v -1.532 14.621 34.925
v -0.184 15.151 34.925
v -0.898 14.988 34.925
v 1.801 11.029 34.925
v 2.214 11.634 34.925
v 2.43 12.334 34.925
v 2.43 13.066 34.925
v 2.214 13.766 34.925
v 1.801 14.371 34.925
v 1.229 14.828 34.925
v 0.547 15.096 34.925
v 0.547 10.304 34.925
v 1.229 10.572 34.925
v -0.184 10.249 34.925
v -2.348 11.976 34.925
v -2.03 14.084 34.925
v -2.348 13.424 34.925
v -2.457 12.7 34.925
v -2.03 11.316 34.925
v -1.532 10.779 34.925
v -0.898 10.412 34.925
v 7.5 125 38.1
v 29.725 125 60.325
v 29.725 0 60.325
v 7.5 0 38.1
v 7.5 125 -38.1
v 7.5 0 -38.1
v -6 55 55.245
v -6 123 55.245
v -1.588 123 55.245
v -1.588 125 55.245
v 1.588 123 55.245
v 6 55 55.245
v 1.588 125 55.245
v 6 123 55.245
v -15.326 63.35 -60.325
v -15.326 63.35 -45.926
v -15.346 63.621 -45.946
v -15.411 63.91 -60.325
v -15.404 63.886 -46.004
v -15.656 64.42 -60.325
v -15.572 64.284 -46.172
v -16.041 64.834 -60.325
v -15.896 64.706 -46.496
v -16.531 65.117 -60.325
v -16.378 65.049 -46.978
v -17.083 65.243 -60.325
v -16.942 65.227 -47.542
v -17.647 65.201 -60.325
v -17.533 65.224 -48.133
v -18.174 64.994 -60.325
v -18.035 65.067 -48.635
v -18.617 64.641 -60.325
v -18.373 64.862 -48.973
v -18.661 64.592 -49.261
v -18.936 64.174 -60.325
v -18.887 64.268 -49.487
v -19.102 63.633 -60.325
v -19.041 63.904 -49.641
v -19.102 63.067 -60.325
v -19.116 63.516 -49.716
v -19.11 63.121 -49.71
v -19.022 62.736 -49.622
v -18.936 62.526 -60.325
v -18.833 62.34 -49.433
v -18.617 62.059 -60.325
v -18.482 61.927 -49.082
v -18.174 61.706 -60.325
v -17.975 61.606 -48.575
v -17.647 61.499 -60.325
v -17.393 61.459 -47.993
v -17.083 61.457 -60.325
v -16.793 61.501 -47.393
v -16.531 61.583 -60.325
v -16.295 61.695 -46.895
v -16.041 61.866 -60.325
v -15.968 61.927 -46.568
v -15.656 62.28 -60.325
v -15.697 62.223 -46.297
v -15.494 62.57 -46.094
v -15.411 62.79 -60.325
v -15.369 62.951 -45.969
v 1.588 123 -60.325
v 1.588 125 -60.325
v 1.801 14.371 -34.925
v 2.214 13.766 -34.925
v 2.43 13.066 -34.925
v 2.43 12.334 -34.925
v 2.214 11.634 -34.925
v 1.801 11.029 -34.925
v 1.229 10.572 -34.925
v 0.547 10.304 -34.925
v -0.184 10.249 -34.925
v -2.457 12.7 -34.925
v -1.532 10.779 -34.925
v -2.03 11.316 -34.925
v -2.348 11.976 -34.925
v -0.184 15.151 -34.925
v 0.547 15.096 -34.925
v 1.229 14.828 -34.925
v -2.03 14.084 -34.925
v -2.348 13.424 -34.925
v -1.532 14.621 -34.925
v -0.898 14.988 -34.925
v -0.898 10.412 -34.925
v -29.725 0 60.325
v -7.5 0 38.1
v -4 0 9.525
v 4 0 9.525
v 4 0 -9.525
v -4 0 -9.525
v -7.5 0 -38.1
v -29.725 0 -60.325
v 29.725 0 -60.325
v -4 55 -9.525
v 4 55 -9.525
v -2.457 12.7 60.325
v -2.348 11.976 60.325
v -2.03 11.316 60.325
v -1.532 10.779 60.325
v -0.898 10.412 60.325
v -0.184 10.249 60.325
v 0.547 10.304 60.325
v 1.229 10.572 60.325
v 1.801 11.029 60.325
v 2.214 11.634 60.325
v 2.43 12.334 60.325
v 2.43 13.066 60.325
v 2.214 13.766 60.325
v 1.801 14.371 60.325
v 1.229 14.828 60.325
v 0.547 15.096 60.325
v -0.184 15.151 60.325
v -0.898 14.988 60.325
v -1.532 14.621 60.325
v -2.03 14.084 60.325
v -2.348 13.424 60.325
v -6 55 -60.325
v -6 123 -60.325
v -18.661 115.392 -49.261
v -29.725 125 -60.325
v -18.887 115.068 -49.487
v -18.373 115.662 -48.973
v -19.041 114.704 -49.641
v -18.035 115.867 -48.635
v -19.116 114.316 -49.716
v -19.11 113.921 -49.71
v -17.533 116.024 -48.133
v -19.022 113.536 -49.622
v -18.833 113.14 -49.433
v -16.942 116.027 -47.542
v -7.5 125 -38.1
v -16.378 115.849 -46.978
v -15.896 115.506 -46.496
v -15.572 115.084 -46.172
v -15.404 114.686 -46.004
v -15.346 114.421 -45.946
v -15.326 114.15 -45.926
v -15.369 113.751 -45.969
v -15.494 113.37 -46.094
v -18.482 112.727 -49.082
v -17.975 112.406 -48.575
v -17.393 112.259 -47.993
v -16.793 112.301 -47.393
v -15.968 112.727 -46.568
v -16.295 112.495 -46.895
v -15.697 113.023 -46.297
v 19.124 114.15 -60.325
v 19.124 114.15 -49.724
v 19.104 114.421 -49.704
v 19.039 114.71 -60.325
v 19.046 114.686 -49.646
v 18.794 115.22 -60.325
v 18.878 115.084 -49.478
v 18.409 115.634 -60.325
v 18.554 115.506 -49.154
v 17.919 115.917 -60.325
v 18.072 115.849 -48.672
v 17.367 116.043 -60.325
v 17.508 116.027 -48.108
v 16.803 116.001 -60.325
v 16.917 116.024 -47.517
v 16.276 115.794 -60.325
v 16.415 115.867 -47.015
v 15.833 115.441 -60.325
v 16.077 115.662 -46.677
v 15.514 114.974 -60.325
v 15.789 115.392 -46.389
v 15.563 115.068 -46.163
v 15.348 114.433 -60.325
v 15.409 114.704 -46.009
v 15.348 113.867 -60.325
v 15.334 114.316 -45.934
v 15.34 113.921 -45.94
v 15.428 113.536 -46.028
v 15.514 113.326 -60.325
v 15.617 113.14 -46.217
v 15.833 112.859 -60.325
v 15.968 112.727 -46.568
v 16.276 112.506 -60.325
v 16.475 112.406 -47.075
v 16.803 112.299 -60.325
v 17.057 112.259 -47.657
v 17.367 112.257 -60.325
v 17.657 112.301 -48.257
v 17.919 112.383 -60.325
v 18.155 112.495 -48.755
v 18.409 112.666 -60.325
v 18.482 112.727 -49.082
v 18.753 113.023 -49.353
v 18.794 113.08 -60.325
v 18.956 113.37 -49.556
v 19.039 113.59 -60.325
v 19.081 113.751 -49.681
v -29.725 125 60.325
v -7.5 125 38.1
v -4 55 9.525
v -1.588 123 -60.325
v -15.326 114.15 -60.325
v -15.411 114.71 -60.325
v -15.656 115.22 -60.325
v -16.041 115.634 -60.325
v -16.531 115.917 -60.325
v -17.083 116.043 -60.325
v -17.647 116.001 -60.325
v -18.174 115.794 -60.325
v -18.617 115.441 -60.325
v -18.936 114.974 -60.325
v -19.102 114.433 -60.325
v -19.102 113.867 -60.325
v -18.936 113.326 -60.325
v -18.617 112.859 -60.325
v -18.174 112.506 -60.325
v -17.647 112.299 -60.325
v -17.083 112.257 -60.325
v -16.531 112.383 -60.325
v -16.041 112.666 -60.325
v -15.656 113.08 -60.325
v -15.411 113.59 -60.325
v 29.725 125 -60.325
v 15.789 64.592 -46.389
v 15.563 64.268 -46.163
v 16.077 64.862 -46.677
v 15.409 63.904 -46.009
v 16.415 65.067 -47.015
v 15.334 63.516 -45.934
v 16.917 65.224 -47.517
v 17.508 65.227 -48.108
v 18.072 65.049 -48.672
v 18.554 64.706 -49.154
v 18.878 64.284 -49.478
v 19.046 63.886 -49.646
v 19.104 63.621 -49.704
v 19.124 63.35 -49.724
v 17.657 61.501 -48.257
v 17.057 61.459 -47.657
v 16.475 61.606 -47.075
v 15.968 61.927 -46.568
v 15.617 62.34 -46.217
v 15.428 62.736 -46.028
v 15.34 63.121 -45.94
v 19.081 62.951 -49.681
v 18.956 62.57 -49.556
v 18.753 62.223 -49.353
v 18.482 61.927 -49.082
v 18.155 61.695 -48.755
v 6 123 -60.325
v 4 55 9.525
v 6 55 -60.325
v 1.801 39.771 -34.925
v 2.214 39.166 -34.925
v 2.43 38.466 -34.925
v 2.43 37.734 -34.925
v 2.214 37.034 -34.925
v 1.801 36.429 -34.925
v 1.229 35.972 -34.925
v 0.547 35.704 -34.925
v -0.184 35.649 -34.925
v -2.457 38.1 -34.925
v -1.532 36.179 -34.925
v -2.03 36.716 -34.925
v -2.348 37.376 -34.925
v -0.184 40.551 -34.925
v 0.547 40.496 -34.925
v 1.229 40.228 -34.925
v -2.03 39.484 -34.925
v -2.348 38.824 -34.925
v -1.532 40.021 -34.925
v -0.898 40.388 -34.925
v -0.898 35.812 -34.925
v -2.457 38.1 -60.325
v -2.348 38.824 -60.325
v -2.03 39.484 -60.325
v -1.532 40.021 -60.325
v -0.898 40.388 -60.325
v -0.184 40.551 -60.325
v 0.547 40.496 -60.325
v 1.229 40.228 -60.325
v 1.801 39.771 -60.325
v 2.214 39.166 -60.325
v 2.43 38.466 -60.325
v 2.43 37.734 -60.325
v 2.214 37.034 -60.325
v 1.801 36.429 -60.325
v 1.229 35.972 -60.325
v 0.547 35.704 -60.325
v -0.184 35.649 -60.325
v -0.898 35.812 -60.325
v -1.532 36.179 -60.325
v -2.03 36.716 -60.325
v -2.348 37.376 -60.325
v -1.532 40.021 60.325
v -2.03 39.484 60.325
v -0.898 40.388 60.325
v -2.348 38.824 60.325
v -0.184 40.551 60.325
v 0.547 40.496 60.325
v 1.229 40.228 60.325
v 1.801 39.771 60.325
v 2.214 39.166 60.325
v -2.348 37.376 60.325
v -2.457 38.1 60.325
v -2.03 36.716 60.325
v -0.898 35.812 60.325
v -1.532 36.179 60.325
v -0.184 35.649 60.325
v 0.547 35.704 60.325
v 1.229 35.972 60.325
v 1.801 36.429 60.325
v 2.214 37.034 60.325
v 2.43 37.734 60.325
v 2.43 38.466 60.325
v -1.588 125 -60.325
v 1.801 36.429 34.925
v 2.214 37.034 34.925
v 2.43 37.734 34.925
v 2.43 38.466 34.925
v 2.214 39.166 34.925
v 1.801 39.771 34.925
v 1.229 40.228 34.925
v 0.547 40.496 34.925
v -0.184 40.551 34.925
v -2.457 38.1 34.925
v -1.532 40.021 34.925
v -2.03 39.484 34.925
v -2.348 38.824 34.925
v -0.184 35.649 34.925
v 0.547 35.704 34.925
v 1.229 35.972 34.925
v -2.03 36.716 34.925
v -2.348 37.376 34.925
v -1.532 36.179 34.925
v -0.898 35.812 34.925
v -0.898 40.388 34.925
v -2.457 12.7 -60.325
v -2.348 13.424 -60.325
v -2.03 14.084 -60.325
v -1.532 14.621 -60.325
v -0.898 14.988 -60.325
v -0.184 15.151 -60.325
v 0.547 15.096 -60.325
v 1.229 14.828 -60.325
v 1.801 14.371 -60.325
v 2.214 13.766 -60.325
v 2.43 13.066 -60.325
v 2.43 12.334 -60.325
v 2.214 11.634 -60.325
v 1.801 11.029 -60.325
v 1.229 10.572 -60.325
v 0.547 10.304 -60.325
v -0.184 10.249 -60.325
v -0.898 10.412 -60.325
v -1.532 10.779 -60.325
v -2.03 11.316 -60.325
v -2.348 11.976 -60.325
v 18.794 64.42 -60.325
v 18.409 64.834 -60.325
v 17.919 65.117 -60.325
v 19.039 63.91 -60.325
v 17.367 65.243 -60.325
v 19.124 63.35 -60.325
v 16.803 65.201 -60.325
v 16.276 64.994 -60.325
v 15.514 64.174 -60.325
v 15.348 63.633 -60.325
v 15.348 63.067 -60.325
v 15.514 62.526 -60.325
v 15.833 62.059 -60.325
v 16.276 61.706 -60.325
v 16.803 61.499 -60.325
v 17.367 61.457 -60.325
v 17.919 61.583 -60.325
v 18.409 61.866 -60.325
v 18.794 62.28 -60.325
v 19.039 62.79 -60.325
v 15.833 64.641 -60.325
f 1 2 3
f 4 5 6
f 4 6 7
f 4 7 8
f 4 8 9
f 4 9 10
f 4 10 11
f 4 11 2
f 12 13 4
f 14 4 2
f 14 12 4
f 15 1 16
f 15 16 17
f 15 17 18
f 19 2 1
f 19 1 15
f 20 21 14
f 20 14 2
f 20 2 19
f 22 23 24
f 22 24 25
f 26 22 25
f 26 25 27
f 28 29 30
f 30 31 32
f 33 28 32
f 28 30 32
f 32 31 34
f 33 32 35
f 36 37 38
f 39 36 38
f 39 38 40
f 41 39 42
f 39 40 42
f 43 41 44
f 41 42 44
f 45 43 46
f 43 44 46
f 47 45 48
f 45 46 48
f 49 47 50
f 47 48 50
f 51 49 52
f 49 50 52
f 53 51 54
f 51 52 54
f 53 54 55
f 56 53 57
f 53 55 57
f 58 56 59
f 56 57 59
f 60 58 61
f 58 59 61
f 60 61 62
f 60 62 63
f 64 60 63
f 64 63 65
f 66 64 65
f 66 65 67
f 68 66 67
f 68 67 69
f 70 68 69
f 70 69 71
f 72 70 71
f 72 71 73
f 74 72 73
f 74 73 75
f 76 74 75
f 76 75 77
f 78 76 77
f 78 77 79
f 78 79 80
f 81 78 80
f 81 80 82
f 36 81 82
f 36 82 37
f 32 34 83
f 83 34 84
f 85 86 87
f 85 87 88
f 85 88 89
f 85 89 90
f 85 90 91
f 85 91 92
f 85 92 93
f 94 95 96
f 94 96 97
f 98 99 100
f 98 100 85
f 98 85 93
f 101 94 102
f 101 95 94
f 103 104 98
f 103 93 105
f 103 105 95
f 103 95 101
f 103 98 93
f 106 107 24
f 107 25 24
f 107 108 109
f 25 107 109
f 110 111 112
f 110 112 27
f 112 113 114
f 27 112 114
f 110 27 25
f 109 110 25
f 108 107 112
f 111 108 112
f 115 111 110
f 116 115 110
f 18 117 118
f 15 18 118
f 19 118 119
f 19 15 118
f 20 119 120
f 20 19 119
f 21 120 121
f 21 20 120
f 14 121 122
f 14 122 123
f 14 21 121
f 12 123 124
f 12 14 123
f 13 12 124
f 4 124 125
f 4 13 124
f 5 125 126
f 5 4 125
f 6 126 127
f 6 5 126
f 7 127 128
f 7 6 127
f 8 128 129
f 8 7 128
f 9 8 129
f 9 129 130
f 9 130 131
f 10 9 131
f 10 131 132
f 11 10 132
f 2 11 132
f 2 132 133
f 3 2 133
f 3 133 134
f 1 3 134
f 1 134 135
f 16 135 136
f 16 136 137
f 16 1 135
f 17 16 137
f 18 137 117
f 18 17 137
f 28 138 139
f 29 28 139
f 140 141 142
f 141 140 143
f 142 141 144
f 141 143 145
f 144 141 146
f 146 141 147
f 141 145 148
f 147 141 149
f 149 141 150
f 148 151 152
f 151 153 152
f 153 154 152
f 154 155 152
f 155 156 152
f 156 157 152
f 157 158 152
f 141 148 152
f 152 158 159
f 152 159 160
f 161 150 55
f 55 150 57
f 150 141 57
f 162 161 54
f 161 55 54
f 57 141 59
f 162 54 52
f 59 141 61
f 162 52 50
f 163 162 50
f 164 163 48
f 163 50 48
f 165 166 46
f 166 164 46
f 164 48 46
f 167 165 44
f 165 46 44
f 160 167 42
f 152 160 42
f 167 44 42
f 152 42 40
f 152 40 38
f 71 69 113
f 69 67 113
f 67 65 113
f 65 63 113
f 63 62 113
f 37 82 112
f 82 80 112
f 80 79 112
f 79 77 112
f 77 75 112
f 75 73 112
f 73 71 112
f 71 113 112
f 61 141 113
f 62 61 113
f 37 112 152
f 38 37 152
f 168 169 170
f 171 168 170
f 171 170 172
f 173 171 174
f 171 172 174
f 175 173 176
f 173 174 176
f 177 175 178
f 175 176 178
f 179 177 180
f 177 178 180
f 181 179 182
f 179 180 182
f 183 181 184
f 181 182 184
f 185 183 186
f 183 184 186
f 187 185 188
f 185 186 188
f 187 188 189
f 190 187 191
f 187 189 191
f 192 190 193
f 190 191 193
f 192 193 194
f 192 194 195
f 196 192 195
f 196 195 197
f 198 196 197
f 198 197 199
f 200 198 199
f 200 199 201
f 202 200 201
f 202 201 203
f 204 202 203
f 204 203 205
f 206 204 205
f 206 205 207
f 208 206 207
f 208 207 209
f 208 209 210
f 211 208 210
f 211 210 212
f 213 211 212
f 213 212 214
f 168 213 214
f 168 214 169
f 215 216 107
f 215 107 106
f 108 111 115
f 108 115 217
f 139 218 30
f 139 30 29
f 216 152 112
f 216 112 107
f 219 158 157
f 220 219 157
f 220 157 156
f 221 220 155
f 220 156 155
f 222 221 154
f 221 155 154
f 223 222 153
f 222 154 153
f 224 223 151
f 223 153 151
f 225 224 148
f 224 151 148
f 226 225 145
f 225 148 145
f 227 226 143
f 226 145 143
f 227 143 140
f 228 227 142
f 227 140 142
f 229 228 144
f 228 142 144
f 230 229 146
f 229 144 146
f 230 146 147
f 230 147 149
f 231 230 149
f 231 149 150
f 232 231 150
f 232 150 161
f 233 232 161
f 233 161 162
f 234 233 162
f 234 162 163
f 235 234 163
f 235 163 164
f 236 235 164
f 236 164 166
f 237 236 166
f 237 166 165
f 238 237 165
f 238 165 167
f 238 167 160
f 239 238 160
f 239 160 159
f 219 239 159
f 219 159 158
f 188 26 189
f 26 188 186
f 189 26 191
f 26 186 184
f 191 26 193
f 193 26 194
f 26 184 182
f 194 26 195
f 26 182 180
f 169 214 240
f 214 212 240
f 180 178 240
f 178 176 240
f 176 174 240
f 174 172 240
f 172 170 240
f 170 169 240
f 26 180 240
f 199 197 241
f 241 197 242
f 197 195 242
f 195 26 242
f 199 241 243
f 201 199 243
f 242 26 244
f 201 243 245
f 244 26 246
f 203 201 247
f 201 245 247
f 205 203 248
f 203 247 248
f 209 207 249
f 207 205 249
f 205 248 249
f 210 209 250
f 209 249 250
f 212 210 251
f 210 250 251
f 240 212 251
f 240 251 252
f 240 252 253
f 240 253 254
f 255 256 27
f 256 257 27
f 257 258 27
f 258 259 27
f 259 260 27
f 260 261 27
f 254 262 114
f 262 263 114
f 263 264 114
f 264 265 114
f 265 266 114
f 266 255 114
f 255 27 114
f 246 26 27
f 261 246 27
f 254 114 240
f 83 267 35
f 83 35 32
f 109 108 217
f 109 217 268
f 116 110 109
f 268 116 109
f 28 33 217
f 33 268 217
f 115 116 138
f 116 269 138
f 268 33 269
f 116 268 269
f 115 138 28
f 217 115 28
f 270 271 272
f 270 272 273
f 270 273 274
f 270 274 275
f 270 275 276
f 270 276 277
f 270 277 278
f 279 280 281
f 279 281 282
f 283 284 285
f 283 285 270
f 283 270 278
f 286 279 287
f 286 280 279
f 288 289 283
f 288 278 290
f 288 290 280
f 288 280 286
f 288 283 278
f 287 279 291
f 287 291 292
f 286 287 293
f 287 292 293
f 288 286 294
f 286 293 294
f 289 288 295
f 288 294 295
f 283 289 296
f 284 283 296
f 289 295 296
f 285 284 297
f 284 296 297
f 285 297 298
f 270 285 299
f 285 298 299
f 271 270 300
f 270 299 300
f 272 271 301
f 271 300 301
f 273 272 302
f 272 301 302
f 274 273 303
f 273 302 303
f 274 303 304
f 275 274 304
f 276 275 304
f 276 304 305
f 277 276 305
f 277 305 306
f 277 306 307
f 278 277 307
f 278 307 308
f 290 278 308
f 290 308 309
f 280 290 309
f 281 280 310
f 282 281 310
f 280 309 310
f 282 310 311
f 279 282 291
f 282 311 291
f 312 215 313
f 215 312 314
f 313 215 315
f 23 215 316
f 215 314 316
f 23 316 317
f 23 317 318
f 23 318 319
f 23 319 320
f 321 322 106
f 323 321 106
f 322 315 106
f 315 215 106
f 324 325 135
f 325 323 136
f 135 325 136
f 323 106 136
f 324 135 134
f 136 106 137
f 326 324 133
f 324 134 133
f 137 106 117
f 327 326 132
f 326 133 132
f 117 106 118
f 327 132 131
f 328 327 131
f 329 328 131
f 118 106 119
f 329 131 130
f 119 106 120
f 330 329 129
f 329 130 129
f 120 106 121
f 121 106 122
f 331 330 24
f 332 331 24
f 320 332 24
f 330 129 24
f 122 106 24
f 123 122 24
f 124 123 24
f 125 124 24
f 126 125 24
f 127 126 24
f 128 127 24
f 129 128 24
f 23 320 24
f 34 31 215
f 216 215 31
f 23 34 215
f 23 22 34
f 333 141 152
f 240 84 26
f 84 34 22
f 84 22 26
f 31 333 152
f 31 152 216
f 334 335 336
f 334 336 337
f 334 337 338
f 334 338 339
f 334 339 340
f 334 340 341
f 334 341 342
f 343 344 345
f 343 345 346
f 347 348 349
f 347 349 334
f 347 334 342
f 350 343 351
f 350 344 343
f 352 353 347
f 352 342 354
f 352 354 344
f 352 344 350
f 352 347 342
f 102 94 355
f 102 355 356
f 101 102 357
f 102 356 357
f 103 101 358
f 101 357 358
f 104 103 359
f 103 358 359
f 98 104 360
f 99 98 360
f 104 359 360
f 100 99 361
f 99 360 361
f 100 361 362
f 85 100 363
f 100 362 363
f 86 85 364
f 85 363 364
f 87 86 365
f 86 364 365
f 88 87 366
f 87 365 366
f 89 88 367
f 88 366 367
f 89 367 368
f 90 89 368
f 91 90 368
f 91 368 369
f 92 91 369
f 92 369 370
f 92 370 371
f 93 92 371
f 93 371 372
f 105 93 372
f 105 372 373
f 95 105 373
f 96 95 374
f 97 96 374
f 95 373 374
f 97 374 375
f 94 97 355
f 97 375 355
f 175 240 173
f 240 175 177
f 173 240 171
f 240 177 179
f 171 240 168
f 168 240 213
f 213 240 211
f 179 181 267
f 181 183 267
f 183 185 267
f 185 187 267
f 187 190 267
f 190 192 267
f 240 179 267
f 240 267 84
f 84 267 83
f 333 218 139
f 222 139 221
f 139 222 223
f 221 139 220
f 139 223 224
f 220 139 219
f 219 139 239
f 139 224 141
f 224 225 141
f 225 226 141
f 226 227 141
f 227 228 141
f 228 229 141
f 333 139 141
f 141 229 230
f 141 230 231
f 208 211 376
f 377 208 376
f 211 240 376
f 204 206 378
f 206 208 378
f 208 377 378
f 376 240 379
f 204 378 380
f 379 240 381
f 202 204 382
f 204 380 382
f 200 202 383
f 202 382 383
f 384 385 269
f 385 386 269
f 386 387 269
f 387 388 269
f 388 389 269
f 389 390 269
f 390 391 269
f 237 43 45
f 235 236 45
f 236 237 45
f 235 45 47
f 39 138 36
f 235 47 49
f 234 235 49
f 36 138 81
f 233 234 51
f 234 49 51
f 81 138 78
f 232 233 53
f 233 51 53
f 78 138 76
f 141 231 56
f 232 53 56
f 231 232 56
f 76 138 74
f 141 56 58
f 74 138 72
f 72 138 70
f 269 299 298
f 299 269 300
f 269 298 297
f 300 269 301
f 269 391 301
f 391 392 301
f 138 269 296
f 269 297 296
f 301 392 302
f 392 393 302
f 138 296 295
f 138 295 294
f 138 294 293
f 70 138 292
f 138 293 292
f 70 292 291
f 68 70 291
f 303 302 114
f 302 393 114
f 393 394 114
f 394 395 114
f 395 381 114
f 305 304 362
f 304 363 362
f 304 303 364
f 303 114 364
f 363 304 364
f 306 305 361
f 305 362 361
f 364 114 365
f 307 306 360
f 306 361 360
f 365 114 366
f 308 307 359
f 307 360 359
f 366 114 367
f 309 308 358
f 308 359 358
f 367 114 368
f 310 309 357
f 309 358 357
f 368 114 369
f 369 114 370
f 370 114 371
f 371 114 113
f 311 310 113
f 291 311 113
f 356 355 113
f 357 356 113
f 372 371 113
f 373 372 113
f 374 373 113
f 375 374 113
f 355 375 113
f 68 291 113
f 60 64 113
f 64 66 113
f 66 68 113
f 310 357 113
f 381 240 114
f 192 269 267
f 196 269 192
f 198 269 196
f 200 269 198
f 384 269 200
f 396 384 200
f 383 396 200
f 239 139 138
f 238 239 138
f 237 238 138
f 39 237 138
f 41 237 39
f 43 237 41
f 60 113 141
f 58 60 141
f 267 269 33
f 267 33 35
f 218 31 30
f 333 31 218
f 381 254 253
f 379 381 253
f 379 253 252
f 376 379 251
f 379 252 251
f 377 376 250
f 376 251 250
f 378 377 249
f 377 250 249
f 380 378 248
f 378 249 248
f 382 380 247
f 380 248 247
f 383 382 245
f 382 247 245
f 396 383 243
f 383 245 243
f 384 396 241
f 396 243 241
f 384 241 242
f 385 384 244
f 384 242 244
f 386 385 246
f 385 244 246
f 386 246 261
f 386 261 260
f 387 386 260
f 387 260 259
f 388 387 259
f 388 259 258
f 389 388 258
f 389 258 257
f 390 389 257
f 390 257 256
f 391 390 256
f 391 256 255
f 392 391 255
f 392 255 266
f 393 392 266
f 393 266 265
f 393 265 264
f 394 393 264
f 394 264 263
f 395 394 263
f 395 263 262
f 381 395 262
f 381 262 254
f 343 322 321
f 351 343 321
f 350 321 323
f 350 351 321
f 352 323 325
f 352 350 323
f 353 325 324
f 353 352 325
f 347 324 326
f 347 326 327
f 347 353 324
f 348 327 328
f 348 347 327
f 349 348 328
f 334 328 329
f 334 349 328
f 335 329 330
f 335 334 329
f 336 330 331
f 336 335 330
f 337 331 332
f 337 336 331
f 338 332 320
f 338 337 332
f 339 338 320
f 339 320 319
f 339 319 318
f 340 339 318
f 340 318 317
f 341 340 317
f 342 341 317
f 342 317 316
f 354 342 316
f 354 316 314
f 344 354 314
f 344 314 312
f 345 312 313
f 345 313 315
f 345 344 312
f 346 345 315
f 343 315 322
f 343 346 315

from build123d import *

# Parameters (mm, degrees)
BOSS_EXTRUDE1_DEPTH            = 125
SKETCH3_W                      = 12
SKETCH3_H                      = 68
CUT_EXTRUDE1_DEPTH             = 115.57
SKETCH4_W                      = 3.175
SKETCH4_H                      = 115.57
CUT_EXTRUDE2_DEPTH             = 3
CUT_EXTRUDE3_REACH             = 143.943
SKETCH5_W                      = 8
SKETCH5_H                      = 19.05
SKETCH6_R                      = 2.45745
CUT_EXTRUDE4_DEPTH             = 25.4
CUT_EXTRUDE5_START             = -25.4
SKETCH7_R                      = 2.45745
CUT_EXTRUDE5_DEPTH             = 25.4
TAP_DRILL_FOR_10_24_TAP1_D     = 3.7973
TAP_DRILL_FOR_10_24_TAP1_DEPTH = 30
TAP_DRILL_FOR_10_24_TAP1_TIP   = 1.140824014


with BuildPart() as part:
    # Sketch1 → Boss-Extrude1 (new body)
    with BuildSketch(Plane(origin=(0, 0, 0), x_dir=(1, 0, 0), z_dir=(0, 1, 0))):
        Polygon((-29.725, -60.325), (29.725, -60.325), (7.5, -38.1), (7.5, 38.1), (29.725, 60.325), (-29.725, 60.325), (-7.5, 38.1), (-7.5, -38.1), align=None)
    extrude(amount=BOSS_EXTRUDE1_DEPTH)

    # Sketch3 → Cut-Extrude1 (cut)
    with BuildSketch(Plane(origin=(0, 0, -60.325), x_dir=(-1, 0, 0), z_dir=(0, 0, -1))):
        with Locations((0, 89)):
            Rectangle(SKETCH3_W, SKETCH3_H)
    extrude(amount=-CUT_EXTRUDE1_DEPTH, mode=Mode.SUBTRACT)

    # Sketch4 → Cut-Extrude2 (cut)
    with BuildSketch(Plane(origin=(0, 125, 0), x_dir=(1, 0, 0), z_dir=(0, 1, 0))):
        with Locations((0, 2.54)):
            Rectangle(SKETCH4_W, SKETCH4_H)
    extrude(amount=-CUT_EXTRUDE2_DEPTH, mode=Mode.SUBTRACT)

    # Sketch5 → Cut-Extrude3 (cut, up to next)
    with BuildSketch(Plane.XZ, mode=Mode.PRIVATE) as cut_extrude3_sk1:
        Rectangle(SKETCH5_W, SKETCH5_H)
    cut_extrude3_tool1 = extrude(cut_extrude3_sk1.sketch, amount=-CUT_EXTRUDE3_REACH, mode=Mode.PRIVATE) & part.part
    add(cut_extrude3_tool1.solids().sort_by_distance((0, 0, 0))[0], mode=Mode.SUBTRACT)

    # Sketch6 → Cut-Extrude4 (cut)
    with BuildSketch(Plane(origin=(0, 0, -60.325), x_dir=(-1, 0, 0), z_dir=(0, 0, -1))):
        with Locations((0, 12.7)):
            Circle(SKETCH6_R)
        with Locations((0, 38.1)):
            Circle(SKETCH6_R)
    extrude(amount=-CUT_EXTRUDE4_DEPTH, mode=Mode.SUBTRACT)

    # Sketch7 → Cut-Extrude5 (cut)
    with BuildSketch(Plane.XY.offset(60.325).offset(CUT_EXTRUDE5_START)):
        with Locations(Location((0, 38.1, 0), (0, 0, 180))):
            Circle(SKETCH7_R)
        with Locations(Location((0, 12.7, 0), (0, 0, 180))):
            Circle(SKETCH7_R)
    extrude(amount=CUT_EXTRUDE5_DEPTH, mode=Mode.SUBTRACT)

    # Tap Drill for #10-24 Tap1
    with Locations(Plane(origin=(0, 0, -60.325), x_dir=(-1, 0, 0), z_dir=(0, 0, -1))):
        with Locations((-17.225, 114.15), (-17.225, 63.35), (17.225, 114.15), (17.225, 63.35)):
            Hole(TAP_DRILL_FOR_10_24_TAP1_D / 2, depth=TAP_DRILL_FOR_10_24_TAP1_DEPTH)
            with Locations((0, 0, -(TAP_DRILL_FOR_10_24_TAP1_DEPTH + TAP_DRILL_FOR_10_24_TAP1_TIP / 2))):  # 118° drill point
                Cone(0, TAP_DRILL_FOR_10_24_TAP1_D / 2, TAP_DRILL_FOR_10_24_TAP1_TIP, mode=Mode.SUBTRACT)


solid = part.part
